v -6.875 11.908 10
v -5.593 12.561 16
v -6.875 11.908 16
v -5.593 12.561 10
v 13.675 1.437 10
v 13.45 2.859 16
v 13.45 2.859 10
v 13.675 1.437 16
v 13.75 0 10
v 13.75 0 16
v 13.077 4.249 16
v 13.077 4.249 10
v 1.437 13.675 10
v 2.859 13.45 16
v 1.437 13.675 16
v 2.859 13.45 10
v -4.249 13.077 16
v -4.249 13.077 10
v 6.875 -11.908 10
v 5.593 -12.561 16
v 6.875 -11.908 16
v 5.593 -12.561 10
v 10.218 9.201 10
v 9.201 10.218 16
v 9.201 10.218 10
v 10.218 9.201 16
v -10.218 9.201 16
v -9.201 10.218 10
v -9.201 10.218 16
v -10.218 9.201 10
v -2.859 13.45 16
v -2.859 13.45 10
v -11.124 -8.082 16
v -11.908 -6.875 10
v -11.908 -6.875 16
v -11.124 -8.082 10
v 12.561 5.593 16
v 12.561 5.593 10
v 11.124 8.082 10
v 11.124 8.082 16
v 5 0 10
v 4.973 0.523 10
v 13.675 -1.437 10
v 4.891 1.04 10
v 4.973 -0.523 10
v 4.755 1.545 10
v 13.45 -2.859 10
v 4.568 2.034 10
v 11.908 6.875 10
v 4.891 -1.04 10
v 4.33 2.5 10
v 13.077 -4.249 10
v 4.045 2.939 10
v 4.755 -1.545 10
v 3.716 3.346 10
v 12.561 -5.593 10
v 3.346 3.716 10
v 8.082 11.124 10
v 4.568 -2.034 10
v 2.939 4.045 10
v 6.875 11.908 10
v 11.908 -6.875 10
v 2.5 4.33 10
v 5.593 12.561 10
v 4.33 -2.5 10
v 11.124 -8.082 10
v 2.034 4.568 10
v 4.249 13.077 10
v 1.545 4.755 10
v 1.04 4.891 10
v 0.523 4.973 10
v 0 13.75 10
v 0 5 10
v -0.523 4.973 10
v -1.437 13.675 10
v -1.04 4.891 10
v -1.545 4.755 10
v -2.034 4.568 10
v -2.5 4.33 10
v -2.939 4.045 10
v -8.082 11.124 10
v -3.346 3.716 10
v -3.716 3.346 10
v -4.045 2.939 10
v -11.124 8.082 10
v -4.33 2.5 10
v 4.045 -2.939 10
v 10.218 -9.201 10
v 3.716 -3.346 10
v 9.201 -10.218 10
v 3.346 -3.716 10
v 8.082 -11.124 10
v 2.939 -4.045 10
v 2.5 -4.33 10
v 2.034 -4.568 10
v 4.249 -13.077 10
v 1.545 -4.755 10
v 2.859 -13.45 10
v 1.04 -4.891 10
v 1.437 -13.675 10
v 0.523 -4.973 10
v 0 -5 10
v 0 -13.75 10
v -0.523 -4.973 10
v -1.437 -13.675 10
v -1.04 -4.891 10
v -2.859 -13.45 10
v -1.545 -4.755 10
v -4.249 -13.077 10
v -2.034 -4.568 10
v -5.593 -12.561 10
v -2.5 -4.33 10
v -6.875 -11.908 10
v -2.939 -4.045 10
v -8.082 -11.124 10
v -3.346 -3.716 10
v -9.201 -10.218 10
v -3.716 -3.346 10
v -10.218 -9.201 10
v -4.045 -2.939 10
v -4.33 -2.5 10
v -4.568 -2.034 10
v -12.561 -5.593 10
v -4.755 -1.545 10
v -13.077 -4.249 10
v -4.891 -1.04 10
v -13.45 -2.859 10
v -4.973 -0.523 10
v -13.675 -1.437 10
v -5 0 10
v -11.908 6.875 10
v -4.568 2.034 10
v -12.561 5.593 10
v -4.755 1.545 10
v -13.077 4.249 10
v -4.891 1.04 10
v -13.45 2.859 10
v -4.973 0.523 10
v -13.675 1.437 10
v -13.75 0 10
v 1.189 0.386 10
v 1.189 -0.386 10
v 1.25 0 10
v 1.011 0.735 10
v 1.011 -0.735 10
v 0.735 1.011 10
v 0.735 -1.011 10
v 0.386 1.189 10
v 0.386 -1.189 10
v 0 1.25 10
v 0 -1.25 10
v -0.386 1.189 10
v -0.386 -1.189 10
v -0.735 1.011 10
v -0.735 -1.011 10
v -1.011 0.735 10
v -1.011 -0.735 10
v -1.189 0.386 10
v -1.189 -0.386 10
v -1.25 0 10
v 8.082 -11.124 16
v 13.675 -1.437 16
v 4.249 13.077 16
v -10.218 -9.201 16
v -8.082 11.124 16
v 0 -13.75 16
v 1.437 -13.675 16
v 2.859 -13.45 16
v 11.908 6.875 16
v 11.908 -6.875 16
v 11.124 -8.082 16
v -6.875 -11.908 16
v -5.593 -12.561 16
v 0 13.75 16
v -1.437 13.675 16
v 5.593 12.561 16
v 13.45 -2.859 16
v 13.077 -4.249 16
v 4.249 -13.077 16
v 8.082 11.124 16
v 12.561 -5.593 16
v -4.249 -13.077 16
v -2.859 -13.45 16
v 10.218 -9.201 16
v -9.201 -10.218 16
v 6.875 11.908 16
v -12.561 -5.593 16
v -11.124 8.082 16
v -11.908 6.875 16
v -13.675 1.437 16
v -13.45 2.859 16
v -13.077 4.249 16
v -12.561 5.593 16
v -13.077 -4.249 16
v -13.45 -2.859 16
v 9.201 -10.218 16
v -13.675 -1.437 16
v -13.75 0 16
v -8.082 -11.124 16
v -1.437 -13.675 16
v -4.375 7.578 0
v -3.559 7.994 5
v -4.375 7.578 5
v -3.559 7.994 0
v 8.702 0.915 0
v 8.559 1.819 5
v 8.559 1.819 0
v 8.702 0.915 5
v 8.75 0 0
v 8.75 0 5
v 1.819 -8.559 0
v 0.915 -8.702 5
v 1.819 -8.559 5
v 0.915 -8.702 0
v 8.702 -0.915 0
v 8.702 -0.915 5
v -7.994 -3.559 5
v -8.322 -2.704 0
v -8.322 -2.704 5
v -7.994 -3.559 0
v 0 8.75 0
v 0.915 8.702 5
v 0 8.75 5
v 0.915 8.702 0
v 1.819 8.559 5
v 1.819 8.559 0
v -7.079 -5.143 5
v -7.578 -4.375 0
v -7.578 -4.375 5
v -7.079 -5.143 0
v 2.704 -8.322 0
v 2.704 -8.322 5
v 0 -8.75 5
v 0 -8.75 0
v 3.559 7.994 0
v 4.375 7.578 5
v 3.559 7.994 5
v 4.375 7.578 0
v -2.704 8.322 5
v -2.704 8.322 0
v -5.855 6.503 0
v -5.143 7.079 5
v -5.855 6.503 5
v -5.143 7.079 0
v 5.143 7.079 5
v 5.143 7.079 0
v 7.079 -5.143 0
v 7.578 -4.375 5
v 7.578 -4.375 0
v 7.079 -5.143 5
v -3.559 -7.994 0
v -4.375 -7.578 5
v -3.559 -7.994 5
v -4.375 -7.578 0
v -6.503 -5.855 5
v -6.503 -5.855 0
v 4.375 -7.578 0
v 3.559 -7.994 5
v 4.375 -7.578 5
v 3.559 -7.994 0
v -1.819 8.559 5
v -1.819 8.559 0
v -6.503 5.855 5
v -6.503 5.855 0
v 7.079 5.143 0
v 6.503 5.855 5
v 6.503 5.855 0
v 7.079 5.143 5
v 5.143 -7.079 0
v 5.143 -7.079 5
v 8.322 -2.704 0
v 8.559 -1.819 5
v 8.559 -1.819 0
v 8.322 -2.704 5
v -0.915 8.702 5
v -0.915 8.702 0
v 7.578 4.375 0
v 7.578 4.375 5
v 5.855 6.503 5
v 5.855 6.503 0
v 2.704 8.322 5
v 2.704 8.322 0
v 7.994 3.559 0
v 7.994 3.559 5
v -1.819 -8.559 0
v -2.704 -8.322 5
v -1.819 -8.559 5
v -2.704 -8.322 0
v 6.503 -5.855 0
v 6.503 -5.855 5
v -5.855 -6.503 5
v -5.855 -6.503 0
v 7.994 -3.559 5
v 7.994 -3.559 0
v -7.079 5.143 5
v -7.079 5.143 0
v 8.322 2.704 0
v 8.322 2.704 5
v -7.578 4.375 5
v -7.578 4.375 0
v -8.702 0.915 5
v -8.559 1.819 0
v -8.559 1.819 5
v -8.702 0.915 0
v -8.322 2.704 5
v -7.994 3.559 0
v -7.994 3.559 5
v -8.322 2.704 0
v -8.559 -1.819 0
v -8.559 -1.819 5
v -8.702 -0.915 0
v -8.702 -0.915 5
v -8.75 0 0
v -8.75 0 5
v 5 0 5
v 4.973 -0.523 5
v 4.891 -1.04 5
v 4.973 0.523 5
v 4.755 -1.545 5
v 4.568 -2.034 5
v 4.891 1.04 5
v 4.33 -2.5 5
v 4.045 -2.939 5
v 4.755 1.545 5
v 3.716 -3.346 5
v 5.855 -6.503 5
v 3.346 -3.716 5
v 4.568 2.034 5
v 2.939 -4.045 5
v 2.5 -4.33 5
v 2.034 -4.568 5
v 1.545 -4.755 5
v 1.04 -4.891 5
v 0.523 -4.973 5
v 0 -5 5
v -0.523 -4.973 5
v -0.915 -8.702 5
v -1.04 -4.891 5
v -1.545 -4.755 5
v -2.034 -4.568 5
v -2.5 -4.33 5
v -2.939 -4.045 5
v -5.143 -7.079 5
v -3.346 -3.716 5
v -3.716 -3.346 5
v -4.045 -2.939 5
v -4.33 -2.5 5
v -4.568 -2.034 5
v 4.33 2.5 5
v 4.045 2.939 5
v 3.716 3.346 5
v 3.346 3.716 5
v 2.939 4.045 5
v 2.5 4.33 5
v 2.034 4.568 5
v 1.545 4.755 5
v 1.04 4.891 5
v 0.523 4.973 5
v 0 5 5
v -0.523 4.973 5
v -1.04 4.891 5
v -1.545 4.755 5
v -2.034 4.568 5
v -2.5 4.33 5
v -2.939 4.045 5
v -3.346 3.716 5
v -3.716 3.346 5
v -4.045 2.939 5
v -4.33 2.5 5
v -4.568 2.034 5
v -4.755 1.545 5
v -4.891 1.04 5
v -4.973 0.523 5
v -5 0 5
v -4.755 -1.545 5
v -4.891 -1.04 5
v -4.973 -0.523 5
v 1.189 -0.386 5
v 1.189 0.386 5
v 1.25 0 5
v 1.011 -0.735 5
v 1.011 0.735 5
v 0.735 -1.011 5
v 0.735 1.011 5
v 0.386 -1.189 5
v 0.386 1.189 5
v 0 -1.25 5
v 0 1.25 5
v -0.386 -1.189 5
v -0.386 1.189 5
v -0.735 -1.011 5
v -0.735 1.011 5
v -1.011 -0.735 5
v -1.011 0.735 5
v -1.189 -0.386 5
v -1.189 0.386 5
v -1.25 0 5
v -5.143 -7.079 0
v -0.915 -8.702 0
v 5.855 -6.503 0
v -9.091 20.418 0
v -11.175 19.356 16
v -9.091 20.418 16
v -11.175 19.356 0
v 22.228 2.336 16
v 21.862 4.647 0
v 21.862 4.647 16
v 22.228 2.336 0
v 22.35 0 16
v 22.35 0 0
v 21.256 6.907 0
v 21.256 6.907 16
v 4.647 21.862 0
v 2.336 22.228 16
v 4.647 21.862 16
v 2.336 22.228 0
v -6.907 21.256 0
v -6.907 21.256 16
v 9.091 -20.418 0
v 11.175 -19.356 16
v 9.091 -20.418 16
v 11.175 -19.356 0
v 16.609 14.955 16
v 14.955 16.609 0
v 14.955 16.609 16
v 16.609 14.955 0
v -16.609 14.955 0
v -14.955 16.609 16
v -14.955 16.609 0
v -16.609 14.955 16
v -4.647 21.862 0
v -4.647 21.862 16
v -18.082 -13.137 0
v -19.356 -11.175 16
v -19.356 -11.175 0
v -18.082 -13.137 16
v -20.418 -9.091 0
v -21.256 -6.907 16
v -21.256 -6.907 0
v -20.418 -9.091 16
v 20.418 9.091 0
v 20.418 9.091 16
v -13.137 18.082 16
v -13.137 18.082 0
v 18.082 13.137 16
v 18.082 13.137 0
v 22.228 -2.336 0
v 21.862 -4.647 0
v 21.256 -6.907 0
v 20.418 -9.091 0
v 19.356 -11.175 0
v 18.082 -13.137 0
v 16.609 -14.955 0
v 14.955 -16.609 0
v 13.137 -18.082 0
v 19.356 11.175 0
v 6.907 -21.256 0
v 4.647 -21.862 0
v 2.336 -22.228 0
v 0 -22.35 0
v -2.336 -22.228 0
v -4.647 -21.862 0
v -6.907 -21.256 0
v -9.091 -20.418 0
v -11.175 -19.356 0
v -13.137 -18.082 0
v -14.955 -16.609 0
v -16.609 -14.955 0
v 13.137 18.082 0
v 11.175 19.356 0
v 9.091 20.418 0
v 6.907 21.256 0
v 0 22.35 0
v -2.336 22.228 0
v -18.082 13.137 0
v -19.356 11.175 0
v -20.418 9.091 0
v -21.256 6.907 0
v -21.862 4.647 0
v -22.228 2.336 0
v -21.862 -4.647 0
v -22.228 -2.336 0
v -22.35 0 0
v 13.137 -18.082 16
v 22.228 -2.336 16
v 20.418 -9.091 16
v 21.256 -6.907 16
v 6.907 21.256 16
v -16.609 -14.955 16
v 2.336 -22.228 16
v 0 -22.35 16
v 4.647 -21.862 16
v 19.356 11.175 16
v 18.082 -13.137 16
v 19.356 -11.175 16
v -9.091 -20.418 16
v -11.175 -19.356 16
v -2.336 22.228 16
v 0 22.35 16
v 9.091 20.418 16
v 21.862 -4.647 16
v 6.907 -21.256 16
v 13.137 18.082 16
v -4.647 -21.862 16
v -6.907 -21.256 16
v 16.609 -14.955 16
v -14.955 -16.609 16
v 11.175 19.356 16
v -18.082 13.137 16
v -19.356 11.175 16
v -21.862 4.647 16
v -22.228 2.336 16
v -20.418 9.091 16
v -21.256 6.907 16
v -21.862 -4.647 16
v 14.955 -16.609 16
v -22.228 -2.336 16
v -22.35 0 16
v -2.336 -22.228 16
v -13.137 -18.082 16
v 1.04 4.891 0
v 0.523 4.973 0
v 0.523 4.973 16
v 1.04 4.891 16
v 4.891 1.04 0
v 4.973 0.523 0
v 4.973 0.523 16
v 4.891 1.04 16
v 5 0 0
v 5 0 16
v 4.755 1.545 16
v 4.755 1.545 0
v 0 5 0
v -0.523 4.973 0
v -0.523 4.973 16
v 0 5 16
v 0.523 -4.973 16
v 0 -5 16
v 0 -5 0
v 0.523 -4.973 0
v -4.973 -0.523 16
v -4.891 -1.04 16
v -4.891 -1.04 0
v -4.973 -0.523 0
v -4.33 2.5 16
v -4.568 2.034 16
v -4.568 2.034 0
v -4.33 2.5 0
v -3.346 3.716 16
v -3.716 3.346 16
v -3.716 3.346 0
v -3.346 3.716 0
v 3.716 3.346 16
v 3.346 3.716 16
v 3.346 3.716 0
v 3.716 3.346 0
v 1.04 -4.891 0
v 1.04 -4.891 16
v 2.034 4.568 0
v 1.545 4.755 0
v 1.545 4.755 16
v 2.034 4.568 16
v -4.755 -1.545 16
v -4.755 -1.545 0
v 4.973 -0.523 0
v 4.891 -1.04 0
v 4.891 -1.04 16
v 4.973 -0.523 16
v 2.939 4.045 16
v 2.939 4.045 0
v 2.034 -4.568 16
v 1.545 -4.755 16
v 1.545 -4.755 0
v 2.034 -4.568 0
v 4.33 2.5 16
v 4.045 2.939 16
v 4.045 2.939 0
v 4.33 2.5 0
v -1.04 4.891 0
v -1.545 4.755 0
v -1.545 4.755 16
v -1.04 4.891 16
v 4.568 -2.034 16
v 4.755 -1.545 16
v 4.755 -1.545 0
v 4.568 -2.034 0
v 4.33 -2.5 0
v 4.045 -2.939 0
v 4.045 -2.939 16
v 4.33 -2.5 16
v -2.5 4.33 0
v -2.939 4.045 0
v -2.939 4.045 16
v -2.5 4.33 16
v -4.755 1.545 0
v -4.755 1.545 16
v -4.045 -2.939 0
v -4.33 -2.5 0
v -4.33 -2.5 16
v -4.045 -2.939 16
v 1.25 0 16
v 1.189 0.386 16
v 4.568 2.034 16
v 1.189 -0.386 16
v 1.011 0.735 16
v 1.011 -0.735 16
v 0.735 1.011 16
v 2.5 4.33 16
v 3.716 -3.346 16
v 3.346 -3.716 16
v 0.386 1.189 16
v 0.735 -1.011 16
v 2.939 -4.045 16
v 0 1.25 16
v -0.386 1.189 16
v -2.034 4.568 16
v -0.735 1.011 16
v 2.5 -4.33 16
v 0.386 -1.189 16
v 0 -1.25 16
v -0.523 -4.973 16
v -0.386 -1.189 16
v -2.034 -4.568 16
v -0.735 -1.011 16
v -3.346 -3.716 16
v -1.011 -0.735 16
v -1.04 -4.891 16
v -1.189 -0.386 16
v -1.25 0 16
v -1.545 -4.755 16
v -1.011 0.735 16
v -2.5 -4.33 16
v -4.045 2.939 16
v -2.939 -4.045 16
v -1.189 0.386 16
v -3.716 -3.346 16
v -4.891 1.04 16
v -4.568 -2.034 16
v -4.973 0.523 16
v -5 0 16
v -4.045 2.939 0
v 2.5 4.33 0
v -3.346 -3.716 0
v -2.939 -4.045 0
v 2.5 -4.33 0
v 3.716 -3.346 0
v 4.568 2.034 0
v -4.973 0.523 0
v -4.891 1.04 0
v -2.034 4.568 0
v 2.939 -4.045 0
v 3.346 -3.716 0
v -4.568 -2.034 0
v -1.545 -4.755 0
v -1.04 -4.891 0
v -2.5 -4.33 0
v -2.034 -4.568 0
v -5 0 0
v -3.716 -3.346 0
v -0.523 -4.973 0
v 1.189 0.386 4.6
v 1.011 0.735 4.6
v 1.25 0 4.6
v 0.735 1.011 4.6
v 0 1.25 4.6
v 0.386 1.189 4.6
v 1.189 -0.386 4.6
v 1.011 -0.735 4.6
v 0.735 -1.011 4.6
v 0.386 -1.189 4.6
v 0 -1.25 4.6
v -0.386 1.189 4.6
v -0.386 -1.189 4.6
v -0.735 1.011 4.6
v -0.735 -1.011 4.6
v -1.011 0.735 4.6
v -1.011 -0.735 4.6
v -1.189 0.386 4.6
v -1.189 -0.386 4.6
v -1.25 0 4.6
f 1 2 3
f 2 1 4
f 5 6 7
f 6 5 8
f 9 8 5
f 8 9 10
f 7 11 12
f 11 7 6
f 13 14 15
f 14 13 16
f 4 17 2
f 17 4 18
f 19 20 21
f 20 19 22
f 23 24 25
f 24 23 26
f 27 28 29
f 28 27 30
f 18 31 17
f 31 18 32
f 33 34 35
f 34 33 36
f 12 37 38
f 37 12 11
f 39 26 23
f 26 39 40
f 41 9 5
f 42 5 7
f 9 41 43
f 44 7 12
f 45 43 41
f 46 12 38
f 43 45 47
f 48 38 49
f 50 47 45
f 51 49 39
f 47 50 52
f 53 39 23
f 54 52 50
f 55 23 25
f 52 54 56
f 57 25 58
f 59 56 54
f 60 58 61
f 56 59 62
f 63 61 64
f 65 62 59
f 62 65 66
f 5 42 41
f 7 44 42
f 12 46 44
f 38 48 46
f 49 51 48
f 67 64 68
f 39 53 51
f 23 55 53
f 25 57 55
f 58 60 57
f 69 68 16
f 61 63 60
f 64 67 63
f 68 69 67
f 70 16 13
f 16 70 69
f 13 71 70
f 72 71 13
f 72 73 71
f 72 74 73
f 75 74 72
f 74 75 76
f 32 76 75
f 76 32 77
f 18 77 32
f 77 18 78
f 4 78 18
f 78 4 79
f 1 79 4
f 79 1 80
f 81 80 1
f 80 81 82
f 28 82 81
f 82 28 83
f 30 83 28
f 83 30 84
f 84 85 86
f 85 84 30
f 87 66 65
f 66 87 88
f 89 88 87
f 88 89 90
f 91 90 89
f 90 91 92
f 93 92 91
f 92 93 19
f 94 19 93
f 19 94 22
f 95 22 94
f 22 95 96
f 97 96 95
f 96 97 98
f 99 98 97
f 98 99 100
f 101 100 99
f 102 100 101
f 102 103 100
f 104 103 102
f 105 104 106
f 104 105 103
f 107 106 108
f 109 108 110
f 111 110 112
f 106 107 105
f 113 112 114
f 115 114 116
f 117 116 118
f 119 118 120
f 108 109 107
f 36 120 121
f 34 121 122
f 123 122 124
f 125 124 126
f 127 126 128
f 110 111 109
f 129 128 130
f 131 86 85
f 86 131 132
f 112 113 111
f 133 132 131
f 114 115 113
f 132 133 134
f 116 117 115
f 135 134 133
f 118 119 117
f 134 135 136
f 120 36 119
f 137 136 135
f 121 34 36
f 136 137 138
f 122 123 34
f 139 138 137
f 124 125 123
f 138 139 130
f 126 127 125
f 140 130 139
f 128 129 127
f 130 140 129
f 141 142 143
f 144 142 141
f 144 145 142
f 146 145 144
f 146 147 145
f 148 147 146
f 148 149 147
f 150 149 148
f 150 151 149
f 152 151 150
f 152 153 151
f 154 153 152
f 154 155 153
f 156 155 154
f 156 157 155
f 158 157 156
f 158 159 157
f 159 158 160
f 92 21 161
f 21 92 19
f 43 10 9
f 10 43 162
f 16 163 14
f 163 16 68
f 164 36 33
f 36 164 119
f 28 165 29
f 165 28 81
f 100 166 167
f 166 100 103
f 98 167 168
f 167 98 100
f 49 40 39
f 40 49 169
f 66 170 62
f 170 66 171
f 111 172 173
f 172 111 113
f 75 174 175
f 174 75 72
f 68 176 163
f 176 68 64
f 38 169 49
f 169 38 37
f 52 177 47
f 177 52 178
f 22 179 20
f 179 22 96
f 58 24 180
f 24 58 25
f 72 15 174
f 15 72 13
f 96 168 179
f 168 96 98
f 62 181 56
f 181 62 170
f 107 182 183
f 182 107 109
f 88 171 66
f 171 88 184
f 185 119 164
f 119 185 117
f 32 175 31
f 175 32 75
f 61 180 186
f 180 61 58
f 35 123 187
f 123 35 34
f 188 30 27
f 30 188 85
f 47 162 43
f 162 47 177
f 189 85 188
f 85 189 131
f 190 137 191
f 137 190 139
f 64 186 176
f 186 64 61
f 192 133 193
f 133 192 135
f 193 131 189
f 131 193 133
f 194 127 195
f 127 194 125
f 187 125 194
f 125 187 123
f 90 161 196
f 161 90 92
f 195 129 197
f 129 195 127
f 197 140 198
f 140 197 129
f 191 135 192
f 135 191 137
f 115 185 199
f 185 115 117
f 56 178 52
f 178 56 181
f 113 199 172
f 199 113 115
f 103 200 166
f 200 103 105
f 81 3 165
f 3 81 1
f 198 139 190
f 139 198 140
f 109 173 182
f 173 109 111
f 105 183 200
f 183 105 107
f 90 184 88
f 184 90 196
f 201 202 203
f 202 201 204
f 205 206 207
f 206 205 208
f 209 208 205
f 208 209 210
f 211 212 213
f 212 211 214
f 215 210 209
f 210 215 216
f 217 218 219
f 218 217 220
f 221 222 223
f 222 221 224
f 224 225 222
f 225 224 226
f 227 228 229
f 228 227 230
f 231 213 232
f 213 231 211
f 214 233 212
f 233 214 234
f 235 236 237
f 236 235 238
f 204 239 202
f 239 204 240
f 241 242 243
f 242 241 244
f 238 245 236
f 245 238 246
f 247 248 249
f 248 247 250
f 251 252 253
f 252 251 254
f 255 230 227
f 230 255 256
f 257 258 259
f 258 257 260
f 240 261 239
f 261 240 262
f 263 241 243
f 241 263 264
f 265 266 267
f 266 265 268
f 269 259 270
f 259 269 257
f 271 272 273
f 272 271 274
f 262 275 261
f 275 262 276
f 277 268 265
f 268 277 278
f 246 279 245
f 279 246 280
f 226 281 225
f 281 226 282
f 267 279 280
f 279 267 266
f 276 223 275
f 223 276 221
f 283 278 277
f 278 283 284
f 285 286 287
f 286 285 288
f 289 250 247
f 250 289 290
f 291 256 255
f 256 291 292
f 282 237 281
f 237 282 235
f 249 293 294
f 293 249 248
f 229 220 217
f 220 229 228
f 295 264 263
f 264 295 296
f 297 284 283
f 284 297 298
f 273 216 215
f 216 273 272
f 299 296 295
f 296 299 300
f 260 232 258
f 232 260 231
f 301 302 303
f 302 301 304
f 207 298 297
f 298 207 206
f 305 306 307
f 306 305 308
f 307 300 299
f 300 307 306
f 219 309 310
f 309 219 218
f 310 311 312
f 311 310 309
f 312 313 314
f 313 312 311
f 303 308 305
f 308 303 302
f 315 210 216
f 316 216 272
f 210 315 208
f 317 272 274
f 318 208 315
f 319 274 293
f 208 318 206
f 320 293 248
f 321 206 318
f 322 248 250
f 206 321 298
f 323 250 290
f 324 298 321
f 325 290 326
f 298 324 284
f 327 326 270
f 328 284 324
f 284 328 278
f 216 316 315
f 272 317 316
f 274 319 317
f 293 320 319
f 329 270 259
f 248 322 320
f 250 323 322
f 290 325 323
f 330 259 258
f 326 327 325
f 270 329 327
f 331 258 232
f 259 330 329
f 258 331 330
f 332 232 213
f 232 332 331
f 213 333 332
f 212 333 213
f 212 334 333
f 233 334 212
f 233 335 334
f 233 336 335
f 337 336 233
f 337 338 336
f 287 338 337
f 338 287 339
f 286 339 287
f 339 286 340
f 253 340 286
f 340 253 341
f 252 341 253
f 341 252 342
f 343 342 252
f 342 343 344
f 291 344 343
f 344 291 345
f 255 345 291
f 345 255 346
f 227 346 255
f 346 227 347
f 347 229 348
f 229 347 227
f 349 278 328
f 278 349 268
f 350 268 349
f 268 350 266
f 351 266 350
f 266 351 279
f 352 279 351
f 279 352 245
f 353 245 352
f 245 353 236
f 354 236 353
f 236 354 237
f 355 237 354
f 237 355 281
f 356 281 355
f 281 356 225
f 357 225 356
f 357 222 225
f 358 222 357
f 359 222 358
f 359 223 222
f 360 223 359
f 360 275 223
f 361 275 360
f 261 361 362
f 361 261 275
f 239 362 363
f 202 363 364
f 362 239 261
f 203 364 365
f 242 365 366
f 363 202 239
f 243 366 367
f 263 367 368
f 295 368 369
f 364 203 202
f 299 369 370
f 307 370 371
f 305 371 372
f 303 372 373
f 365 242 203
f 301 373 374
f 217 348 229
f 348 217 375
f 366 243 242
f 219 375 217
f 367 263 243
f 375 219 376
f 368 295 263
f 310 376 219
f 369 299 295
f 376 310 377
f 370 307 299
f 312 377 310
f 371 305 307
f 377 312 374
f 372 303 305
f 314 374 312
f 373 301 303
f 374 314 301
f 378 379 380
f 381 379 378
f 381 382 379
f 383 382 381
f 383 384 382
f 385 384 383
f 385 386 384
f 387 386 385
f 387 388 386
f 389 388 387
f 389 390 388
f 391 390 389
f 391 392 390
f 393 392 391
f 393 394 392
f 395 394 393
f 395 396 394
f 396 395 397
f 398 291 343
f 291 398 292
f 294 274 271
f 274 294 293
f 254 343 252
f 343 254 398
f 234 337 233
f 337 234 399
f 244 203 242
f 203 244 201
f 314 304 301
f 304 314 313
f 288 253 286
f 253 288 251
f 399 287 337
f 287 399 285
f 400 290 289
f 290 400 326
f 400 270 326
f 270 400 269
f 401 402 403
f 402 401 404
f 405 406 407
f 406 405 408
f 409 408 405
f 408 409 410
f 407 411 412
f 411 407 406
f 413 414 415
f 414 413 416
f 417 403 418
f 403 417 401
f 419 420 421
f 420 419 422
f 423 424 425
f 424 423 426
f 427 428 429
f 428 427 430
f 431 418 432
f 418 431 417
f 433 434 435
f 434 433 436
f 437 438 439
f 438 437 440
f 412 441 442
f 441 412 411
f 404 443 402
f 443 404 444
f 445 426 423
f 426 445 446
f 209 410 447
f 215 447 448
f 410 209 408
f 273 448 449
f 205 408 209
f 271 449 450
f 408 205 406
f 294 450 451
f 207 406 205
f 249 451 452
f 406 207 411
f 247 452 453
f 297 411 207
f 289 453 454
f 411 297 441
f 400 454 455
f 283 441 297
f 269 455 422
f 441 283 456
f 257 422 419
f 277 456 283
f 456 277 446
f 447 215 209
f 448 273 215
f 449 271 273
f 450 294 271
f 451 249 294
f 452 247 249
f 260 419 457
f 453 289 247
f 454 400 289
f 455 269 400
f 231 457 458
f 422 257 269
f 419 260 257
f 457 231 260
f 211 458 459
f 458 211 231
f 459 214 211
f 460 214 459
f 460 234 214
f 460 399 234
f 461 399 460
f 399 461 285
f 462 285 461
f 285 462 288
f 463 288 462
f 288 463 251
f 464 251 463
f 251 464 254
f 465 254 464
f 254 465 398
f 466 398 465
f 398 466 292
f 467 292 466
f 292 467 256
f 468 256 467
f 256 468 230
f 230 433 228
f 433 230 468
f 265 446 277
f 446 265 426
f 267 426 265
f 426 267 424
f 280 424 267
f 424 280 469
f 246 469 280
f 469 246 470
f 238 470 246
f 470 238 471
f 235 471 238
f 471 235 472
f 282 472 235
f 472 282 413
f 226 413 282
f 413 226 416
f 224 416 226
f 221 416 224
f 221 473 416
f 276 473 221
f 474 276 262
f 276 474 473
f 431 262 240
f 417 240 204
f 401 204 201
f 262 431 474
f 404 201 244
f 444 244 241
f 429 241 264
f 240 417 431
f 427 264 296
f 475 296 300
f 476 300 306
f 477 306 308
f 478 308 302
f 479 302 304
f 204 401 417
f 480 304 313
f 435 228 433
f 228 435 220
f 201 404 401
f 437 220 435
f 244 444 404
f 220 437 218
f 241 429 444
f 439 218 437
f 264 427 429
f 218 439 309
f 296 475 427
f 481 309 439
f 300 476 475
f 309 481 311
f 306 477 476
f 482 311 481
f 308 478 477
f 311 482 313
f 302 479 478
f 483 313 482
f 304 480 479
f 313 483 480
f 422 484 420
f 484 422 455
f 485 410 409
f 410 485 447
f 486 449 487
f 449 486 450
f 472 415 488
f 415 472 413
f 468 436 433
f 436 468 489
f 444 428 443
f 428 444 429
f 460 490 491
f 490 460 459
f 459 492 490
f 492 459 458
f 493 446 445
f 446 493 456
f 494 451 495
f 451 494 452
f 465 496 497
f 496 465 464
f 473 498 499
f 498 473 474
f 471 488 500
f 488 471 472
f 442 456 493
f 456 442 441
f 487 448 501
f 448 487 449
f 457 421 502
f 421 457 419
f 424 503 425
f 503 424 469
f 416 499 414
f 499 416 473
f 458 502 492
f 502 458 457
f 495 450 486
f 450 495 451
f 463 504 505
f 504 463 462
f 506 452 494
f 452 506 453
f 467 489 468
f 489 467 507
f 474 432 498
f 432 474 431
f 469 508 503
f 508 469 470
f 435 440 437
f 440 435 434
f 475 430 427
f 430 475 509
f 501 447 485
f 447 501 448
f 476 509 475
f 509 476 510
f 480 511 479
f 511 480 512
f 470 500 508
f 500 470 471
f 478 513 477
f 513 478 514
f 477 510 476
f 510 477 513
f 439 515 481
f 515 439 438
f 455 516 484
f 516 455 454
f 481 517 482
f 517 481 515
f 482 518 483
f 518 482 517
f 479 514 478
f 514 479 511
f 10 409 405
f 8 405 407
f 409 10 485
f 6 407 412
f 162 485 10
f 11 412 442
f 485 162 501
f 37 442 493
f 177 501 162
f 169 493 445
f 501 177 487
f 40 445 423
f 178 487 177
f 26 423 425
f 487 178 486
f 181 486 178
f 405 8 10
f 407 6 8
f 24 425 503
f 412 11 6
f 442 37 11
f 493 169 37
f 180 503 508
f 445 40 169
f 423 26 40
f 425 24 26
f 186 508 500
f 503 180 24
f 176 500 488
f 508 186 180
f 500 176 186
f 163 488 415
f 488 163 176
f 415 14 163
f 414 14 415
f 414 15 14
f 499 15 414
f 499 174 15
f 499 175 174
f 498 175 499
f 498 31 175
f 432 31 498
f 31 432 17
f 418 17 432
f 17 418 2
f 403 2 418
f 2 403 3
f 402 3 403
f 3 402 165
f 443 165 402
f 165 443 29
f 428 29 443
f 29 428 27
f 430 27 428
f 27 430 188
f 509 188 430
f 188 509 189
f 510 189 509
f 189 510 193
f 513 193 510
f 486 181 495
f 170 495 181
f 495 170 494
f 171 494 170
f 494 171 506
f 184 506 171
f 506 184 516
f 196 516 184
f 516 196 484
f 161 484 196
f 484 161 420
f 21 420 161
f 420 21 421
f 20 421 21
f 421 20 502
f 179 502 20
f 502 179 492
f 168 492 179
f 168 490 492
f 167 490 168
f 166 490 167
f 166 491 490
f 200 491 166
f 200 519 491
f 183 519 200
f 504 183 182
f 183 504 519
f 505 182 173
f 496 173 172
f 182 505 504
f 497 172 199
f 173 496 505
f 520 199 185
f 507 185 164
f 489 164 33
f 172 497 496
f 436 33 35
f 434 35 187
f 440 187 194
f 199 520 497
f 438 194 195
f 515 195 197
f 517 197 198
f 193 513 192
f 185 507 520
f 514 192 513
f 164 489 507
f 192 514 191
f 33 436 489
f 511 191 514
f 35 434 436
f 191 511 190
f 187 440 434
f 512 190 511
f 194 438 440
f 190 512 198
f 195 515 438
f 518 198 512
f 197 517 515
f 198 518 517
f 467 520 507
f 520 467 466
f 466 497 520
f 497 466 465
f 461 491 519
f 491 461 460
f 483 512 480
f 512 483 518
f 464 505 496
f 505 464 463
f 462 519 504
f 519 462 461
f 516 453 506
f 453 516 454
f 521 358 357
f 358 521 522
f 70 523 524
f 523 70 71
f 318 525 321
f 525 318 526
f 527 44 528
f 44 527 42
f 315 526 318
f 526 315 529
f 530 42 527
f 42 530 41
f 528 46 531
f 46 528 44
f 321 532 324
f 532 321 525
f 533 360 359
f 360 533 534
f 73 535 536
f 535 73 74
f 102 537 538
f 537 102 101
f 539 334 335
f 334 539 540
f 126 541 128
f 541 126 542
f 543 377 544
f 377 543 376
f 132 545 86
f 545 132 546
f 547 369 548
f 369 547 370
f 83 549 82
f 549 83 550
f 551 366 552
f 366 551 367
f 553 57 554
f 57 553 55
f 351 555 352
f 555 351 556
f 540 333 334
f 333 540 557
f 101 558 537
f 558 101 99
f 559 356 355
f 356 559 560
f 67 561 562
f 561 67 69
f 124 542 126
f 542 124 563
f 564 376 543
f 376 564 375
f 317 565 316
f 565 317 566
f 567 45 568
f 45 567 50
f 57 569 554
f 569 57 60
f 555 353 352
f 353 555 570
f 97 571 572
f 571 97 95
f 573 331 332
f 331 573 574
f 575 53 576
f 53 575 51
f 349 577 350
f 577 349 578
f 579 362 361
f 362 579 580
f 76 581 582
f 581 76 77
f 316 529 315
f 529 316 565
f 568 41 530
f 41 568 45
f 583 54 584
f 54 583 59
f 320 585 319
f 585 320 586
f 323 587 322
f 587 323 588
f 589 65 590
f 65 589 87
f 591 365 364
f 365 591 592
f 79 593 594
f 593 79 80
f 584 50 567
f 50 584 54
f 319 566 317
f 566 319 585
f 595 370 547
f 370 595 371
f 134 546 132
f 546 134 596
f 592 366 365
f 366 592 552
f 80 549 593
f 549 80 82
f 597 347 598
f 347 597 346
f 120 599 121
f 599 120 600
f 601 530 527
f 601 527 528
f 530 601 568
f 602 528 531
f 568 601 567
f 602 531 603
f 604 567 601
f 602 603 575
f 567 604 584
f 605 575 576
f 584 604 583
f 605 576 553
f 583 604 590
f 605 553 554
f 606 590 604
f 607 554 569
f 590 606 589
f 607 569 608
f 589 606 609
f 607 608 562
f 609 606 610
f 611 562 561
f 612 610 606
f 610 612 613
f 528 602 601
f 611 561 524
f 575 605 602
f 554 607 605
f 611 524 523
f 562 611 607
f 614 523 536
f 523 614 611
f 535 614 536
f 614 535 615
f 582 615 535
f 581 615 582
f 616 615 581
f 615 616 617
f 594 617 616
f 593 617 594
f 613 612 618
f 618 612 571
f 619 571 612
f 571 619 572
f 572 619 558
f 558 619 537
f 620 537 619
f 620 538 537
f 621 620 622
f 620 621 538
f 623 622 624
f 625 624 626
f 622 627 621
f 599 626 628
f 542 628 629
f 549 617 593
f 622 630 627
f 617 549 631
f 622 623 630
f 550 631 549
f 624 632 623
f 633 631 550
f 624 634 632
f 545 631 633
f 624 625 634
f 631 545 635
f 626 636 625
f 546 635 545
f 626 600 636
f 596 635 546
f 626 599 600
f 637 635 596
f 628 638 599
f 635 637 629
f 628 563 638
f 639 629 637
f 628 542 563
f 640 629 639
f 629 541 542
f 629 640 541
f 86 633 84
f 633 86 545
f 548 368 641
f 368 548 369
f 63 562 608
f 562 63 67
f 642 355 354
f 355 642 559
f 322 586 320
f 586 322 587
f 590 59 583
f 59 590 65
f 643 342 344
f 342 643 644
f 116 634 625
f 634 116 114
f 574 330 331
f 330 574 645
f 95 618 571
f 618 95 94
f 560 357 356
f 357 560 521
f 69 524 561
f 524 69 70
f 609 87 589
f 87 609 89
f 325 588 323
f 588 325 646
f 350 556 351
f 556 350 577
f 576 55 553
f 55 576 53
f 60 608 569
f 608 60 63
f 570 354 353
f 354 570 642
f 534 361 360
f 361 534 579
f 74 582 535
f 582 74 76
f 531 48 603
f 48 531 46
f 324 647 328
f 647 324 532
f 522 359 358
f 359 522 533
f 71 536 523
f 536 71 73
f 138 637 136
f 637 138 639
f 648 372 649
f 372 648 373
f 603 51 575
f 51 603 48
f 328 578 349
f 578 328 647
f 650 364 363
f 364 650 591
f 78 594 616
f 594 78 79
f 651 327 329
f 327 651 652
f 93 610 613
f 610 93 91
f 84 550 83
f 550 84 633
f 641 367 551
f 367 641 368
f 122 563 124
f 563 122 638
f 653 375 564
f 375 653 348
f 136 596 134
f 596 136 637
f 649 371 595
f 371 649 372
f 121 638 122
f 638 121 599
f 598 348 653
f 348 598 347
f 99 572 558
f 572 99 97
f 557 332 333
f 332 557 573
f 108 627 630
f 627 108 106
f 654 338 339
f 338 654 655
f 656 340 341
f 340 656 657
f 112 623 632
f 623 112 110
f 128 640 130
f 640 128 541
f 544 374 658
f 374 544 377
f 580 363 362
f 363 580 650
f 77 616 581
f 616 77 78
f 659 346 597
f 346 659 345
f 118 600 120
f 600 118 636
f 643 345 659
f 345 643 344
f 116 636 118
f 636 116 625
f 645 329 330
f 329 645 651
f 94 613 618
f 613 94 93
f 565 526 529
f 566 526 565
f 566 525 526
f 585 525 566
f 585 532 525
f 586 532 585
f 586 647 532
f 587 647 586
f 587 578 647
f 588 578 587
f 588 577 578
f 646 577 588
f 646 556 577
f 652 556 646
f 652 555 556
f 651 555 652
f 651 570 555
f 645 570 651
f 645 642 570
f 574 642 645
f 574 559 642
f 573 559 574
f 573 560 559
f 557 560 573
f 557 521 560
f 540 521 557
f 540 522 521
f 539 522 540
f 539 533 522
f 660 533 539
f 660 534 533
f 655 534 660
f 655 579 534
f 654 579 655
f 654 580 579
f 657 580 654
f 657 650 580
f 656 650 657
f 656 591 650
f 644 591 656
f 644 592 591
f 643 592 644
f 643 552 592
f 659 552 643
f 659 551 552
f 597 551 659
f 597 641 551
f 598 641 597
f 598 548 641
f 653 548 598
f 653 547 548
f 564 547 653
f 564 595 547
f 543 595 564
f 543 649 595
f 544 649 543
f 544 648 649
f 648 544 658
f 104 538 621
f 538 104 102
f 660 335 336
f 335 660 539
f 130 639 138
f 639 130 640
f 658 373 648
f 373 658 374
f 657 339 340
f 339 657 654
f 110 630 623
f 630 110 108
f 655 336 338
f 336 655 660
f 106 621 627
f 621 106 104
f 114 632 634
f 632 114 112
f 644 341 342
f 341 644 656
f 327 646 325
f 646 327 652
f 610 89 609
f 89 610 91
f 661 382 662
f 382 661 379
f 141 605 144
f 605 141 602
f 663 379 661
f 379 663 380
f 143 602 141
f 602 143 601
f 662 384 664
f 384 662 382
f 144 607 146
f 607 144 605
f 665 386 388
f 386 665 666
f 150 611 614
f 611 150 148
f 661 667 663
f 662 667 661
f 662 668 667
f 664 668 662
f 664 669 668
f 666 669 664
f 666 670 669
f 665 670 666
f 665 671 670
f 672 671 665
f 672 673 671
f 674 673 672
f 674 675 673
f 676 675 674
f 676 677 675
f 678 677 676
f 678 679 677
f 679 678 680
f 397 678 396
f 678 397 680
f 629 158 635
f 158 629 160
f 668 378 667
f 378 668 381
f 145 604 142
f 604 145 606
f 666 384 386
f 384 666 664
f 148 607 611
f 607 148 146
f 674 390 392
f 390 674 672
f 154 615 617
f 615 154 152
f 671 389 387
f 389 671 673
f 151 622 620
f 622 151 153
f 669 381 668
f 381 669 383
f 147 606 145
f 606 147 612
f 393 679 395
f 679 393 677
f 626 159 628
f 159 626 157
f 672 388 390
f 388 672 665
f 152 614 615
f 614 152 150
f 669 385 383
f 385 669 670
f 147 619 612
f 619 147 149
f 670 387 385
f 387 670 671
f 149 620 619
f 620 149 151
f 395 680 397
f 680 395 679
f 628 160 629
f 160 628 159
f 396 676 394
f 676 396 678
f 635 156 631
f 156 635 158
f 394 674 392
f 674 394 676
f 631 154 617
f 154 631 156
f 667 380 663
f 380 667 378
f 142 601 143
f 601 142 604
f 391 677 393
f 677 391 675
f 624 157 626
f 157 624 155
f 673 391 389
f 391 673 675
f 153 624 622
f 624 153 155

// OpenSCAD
difference() {
    cylinder(h = 16, r = 44.7/2, $fn = 60);
    union () {
        translate([0,0,10]) cylinder(h = 16, r = (44.7)/2-8.6, $fn = 60);
        translate([0,0,-1]) cylinder(h = 6, r = 17.5/2, $fn = 60);
    }
}
difference() {
    cylinder(h = 16, r = 5, $fn = 60);
    // Axel hole
    translate([0,0,4.6]) cylinder(h=14.5-3, r=2.5/2, $fn=20);
}
